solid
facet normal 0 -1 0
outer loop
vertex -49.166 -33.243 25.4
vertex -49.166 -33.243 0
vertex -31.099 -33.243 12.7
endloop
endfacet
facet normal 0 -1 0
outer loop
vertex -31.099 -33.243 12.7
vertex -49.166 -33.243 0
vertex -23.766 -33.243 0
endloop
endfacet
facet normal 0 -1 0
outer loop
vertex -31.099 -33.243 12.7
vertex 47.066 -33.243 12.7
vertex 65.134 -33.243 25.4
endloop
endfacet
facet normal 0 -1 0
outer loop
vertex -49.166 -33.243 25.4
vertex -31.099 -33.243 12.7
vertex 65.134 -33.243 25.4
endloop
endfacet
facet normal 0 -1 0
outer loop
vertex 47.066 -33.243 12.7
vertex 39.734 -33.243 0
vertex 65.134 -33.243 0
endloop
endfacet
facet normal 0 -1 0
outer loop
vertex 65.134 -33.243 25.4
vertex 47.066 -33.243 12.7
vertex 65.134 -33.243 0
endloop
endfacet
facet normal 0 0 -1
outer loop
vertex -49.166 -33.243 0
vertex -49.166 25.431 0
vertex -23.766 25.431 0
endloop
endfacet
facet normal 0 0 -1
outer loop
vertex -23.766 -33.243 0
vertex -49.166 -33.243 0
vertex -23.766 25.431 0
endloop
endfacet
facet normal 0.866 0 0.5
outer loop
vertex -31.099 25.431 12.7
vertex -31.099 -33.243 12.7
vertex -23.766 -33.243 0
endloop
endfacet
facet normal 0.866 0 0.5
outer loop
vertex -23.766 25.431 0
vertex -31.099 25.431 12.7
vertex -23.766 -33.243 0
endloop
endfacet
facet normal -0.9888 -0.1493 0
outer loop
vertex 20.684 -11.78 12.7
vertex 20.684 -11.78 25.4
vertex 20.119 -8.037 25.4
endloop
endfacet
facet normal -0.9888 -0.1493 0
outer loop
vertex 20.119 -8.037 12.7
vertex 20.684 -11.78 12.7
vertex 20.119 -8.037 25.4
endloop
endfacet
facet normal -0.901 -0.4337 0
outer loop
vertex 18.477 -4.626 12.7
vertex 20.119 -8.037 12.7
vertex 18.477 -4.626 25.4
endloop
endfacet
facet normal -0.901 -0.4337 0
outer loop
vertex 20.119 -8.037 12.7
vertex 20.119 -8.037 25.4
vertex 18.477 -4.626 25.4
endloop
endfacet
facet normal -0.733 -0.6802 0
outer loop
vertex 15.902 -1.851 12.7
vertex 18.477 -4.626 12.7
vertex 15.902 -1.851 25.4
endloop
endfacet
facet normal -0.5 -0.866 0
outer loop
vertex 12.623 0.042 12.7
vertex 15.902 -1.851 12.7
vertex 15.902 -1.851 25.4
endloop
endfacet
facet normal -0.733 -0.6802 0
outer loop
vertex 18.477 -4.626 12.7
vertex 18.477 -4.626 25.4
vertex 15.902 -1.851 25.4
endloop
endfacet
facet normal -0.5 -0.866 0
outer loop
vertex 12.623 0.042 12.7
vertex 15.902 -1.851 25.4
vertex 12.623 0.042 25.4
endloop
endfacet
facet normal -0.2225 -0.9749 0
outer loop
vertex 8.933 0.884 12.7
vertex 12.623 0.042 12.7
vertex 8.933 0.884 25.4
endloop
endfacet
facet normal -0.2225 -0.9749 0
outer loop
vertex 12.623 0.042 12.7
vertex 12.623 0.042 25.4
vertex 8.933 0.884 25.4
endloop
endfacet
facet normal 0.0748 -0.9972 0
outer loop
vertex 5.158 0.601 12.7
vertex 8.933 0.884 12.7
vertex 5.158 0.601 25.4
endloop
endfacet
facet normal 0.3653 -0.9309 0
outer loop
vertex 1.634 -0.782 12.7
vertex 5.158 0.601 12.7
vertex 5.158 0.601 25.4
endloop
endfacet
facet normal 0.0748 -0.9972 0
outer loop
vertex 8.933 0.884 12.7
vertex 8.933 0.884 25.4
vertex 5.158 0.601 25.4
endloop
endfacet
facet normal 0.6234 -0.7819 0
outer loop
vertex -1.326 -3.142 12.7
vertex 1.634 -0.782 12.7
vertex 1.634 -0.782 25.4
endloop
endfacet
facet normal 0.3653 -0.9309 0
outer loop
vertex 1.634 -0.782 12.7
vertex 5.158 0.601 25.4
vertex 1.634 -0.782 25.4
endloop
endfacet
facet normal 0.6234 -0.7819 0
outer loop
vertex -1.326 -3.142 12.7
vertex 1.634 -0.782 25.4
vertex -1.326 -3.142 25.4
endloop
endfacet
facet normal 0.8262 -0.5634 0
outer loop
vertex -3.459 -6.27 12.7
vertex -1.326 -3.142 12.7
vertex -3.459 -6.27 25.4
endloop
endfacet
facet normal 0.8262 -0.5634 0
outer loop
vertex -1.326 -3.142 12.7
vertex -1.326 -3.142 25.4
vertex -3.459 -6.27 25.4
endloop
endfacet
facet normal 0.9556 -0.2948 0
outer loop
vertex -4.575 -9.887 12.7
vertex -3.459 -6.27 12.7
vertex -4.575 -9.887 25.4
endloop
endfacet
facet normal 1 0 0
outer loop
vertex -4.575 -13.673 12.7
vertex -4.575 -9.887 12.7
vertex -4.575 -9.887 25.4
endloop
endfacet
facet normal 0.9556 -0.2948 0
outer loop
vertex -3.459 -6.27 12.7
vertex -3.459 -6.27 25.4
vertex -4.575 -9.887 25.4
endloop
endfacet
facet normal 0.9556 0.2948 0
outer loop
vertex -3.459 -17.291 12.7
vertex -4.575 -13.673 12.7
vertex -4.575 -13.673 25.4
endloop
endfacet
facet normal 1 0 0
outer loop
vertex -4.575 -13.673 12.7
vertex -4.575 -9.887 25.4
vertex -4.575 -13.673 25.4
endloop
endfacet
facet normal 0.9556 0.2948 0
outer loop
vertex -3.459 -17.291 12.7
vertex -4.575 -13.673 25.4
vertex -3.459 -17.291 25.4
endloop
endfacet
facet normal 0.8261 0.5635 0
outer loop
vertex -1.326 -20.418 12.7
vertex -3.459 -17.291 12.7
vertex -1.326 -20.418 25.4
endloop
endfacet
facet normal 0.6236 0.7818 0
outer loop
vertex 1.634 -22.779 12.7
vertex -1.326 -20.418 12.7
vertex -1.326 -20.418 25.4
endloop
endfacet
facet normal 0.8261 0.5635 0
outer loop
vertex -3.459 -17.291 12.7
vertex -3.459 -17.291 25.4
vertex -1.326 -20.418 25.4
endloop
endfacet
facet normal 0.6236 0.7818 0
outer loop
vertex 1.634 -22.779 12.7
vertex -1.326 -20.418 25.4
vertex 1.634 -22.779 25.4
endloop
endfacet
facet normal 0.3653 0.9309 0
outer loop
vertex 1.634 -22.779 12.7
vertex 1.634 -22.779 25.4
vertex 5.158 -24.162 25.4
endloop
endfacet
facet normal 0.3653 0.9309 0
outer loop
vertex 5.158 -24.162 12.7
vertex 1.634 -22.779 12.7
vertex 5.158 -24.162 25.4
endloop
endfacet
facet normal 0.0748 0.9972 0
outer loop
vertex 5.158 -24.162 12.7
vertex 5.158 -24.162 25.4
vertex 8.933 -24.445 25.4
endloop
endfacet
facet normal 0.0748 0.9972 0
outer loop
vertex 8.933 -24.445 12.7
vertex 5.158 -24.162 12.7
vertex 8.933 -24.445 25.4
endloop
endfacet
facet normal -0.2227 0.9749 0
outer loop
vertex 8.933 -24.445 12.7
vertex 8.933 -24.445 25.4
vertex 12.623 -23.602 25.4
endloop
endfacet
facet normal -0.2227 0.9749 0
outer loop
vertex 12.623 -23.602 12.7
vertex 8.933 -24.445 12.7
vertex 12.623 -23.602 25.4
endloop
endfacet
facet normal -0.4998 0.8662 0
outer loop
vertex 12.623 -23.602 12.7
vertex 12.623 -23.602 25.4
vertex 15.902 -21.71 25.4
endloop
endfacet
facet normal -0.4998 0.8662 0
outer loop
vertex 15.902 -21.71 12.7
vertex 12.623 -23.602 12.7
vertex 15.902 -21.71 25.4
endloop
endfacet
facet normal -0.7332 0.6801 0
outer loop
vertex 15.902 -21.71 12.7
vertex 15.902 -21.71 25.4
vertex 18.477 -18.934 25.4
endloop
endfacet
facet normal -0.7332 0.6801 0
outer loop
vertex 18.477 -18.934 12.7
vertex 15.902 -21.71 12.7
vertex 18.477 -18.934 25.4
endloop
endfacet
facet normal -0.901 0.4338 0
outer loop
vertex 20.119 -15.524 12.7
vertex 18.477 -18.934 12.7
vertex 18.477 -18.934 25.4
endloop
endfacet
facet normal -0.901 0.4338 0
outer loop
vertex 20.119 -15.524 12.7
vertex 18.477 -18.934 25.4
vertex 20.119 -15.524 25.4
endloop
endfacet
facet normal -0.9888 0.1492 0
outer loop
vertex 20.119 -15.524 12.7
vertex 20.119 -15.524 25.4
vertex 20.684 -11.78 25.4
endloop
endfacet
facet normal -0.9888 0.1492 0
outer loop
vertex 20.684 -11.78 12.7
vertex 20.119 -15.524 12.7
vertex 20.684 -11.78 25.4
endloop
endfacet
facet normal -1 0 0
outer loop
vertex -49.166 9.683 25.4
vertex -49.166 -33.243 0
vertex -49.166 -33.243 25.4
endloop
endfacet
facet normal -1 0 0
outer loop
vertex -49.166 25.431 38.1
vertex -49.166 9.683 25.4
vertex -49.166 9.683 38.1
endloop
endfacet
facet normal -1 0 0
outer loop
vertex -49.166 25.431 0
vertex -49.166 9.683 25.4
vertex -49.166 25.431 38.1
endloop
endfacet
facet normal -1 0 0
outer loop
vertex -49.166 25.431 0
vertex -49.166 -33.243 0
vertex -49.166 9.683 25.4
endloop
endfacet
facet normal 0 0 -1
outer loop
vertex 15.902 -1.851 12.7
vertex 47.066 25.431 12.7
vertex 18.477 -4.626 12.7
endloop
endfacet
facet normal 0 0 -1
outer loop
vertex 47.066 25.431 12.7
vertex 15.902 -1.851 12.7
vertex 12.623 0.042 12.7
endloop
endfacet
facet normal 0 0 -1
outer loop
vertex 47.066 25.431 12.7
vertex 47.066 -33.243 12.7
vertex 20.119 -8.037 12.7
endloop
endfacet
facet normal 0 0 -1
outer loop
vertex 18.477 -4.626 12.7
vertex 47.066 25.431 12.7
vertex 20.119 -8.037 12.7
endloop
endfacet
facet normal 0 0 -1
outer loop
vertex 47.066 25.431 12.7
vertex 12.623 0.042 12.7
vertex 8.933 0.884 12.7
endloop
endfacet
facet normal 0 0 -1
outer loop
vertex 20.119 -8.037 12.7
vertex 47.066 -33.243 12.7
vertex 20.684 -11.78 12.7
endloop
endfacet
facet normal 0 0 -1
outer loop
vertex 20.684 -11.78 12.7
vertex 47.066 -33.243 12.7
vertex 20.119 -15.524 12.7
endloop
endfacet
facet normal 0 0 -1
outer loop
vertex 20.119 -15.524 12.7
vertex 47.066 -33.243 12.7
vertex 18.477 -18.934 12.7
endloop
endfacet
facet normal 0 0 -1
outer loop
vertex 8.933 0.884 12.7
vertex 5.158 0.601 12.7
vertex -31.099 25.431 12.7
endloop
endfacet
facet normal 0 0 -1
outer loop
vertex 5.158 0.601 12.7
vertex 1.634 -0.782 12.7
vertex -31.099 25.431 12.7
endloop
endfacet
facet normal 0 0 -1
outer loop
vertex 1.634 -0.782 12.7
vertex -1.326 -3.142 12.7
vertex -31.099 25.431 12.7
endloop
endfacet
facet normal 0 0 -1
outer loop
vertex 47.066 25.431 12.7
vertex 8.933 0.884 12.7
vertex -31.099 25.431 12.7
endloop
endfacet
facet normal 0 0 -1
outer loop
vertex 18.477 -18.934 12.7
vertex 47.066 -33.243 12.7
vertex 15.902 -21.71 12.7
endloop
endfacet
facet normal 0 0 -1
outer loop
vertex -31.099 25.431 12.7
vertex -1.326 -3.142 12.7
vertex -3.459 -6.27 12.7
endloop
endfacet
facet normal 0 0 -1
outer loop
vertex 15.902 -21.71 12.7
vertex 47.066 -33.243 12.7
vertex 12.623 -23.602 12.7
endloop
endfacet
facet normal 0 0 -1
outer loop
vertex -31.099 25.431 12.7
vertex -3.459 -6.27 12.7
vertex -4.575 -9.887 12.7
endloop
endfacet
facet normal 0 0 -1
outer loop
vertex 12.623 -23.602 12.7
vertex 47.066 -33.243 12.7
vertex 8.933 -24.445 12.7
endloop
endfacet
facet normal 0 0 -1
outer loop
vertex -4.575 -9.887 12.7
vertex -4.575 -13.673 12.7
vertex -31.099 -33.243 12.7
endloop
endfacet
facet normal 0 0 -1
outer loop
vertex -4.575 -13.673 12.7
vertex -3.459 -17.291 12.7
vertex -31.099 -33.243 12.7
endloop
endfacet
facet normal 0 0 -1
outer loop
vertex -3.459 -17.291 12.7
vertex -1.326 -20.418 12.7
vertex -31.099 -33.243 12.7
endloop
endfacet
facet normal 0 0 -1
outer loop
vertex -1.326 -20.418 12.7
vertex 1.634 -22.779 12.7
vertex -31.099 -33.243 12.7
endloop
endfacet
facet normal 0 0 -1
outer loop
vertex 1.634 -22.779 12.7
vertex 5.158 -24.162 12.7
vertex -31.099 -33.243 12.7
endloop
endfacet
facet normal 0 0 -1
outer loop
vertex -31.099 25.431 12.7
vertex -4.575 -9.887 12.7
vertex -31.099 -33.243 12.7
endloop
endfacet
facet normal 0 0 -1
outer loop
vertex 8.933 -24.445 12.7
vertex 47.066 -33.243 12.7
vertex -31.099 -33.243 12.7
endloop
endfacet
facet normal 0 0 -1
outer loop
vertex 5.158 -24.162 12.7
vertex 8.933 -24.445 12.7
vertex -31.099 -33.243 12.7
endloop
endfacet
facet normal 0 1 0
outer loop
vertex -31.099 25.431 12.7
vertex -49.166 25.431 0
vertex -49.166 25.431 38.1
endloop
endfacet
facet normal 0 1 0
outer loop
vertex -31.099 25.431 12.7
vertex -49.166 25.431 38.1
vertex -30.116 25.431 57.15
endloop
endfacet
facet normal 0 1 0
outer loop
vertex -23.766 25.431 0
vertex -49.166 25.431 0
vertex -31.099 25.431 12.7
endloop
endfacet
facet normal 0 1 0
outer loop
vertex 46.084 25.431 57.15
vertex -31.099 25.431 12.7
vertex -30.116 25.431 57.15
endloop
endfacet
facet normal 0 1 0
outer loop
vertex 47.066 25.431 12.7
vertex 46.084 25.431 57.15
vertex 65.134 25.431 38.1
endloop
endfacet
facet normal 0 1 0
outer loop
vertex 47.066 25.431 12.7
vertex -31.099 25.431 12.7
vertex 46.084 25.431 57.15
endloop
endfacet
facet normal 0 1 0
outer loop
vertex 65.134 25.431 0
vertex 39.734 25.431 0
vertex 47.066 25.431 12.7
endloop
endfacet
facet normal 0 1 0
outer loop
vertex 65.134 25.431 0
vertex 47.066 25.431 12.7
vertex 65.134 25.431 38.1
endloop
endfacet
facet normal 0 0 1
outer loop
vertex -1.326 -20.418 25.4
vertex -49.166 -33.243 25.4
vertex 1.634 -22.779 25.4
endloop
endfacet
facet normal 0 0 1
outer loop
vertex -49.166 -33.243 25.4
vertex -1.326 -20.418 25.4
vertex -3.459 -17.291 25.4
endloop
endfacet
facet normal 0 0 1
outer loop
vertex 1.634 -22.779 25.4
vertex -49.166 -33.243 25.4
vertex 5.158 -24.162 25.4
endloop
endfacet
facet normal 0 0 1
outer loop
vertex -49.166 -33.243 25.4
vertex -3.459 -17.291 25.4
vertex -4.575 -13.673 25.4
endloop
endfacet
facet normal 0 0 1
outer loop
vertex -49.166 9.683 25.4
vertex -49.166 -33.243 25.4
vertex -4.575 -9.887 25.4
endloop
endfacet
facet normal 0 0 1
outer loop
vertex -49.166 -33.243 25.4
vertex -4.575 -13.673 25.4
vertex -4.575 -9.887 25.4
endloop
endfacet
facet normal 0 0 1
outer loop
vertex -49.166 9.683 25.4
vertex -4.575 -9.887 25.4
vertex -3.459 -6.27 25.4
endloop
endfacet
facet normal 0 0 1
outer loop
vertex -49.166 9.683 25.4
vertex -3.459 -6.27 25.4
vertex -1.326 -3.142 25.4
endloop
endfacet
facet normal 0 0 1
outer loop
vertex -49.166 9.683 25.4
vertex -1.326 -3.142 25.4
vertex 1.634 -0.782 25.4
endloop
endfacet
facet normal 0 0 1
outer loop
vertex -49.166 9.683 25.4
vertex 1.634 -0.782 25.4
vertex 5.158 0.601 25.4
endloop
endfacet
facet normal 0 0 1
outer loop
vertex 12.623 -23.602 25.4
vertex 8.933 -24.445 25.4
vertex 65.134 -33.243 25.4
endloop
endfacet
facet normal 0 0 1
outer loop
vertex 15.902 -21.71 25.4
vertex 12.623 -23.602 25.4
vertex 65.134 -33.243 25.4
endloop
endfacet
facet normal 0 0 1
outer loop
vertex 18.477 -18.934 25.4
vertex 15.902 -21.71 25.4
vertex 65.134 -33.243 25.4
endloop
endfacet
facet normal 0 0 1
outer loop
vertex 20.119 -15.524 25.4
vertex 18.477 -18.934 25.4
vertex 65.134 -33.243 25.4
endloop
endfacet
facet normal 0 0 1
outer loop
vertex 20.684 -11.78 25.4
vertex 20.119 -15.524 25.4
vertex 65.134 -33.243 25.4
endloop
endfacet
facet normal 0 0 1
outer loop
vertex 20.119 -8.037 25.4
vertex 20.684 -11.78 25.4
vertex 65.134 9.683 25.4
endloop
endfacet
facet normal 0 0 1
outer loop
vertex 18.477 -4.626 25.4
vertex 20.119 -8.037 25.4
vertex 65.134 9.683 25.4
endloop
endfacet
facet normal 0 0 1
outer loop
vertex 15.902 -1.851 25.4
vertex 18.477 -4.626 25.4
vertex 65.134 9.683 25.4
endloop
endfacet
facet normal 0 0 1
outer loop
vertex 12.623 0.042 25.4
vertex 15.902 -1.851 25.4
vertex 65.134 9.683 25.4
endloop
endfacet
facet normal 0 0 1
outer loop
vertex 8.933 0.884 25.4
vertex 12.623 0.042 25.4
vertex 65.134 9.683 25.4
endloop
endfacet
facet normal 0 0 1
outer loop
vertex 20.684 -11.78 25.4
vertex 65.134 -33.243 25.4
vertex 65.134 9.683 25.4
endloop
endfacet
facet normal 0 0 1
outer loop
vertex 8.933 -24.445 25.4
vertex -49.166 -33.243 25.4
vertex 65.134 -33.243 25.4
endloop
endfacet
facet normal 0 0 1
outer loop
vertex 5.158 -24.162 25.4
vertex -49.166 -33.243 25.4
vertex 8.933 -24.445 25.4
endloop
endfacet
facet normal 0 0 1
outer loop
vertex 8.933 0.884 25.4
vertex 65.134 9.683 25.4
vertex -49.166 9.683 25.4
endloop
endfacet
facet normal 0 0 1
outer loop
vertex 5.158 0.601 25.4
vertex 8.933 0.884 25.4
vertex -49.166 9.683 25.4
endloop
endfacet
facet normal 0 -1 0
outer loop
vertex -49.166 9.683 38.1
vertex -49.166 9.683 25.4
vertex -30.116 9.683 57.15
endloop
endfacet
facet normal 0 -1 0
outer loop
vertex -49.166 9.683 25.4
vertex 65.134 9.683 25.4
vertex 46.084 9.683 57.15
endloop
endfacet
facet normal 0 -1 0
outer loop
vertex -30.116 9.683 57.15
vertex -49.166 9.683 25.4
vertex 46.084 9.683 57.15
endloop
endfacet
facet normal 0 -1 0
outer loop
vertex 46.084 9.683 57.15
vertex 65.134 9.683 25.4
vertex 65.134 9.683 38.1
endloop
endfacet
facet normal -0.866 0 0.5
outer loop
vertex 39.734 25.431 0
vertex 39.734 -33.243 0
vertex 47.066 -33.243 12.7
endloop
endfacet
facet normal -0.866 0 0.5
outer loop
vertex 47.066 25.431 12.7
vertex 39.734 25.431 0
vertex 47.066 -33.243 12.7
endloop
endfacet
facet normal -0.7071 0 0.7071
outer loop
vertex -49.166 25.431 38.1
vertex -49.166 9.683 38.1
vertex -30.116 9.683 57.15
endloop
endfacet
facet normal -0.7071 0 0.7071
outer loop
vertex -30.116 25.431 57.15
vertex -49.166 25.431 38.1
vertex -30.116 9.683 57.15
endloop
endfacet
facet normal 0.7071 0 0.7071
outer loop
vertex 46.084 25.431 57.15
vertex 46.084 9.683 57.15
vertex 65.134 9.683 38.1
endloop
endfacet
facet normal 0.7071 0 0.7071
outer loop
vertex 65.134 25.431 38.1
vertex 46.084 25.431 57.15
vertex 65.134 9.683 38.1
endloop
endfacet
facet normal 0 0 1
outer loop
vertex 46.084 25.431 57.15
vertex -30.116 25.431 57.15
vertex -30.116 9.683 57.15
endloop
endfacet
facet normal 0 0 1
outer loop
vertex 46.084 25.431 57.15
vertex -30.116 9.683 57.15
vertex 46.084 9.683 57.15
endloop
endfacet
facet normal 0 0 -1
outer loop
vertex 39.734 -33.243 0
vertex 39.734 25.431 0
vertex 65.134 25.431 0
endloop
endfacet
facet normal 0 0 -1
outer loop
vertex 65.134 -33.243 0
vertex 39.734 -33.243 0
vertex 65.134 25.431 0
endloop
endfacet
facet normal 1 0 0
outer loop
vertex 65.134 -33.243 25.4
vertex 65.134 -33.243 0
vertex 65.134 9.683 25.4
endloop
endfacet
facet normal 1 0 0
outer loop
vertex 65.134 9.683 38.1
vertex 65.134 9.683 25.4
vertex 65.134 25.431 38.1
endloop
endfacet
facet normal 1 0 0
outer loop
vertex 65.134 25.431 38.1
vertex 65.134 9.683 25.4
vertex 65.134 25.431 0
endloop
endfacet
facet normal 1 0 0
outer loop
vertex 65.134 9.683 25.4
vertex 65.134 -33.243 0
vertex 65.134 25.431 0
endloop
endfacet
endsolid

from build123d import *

# Parameters (mm, degrees)
F0_W     = 114.3
F0_H     = 58.674
F1_DEPTH = 57.15
F2_W     = 42.926
F2_H     = 31.75
F3_DEPTH = 143.256
F5_DEPTH = 25.4
F7_DEPTH = 101.092
F8_R     = 12.7
F9_DEPTH = 25.4


with BuildPart() as f1:
    # F0 (on Top) → F1 (new body)
    with BuildSketch(Plane.XY):
        with Locations((7.98354, -3.90625)):
            Rectangle(F0_W, F0_H)
    extrude(amount=F1_DEPTH)

    # F2 (on face) → F3 (cut)
    with BuildSketch(Plane.YZ.offset(65.13354)):
        with Locations((-11.78025, 41.275)):
            Rectangle(F2_W, F2_H)
    extrude(amount=-F3_DEPTH, mode=Mode.SUBTRACT)

    # F4 (on face) → F5 (cut)
    with BuildSketch(Plane.XZ.offset(-9.68275)):
        Polygon((65.13354, 38.1), (65.13354, 57.15), (46.08354, 57.15), align=None)
        Polygon((-49.16646, 38.1), (-30.11646, 57.15), (-49.16646, 57.15), align=None)
    extrude(amount=-F5_DEPTH, mode=Mode.SUBTRACT)

    # F6 (on face) → F7 (cut)
    with BuildSketch(Plane.XZ.offset(33.24325)):
        Polygon((39.73354, 12.7), (-23.76646, 12.7), (-31.098808, 12.7), (-23.76646, 0), (39.73354, 0), (47.065889, 12.7), align=None)
    extrude(amount=-F7_DEPTH, mode=Mode.SUBTRACT)

    # F8 (on face) → F9 (cut)
    with BuildSketch(Plane.XY.offset(25.4)):
        with Locations((7.98354, -11.78025)):
            Circle(F8_R)
    extrude(amount=-F9_DEPTH, mode=Mode.SUBTRACT)


solid = f1.part
